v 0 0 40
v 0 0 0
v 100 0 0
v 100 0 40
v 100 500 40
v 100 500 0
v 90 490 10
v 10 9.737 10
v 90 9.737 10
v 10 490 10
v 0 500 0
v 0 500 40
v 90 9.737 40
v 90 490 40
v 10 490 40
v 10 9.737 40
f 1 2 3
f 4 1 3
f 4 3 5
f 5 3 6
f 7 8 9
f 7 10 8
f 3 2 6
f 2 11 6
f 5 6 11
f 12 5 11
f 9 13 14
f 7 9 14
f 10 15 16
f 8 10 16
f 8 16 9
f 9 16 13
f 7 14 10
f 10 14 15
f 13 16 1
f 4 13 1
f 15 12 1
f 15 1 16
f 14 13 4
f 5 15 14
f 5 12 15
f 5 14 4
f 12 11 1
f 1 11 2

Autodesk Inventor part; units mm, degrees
ref_plane "YZ Plane" through (0, 0, 0) normal (1, 0, 0) x (0, 1, 0)
ref_plane "XZ Plane" through (0, 0, 0) normal (0, 1, 0) x (-1, 0, 0)
ref_plane "XY Plane" through (0, 0, 0) normal (0, 0, 1) x (1, 0, 0)
sketch "Sketch1" plane through (0, 0, 0) normal (0, 0, 1) x (1, 0, 0)
  line L0 (0, 0) -> (100, 0)
  line L1 (100, 0) -> (100, 500)
  line L2 (100, 500) -> (0, 500)
  line L3 (0, 500) -> (0, 0)
  dimension "d0" = 100
  dimension "d1" = 500
extrude "Extrusion1" add sketch "Sketch1" along normal blind 40
sketch "Sketch2" plane through (0, 0, 40) normal (0, 0, 1) x (1, 0, 0)
  line L0 (0, 0) -> (100, 0) projected
  line L1 (50, 0) -> (50, 10)
  dimension "d4" = 10
sketch "Sketch3" plane through (0, 0, 40) normal (0, 0, 1) x (1, 0, 0)
  line L0 (100, 500) -> (0, 500) projected
  line L1 (50, 500) -> (50, 490)
  line L2 (100, 0) -> (100, 500) projected
  line L3 (100, 250) -> (90, 250)
  line L4 (0, 500) -> (0, 0) projected
  line L5 (0, 250) -> (10, 250)
  line L6 (90, 490) -> (10, 490)
  line L7 (10, 490) -> (10, 9.7366)
  line L8 (10, 9.7366) -> (90, 9.7366)
  line L9 (90, 9.7366) -> (90, 490)
  dimension "d5" = 10
  dimension "d7" = 10
extrude "Extrusion2" cut sketch "Sketch3" against normal blind 30 contours L6 L9 L8 L7
properties part number "S.hollow box"
